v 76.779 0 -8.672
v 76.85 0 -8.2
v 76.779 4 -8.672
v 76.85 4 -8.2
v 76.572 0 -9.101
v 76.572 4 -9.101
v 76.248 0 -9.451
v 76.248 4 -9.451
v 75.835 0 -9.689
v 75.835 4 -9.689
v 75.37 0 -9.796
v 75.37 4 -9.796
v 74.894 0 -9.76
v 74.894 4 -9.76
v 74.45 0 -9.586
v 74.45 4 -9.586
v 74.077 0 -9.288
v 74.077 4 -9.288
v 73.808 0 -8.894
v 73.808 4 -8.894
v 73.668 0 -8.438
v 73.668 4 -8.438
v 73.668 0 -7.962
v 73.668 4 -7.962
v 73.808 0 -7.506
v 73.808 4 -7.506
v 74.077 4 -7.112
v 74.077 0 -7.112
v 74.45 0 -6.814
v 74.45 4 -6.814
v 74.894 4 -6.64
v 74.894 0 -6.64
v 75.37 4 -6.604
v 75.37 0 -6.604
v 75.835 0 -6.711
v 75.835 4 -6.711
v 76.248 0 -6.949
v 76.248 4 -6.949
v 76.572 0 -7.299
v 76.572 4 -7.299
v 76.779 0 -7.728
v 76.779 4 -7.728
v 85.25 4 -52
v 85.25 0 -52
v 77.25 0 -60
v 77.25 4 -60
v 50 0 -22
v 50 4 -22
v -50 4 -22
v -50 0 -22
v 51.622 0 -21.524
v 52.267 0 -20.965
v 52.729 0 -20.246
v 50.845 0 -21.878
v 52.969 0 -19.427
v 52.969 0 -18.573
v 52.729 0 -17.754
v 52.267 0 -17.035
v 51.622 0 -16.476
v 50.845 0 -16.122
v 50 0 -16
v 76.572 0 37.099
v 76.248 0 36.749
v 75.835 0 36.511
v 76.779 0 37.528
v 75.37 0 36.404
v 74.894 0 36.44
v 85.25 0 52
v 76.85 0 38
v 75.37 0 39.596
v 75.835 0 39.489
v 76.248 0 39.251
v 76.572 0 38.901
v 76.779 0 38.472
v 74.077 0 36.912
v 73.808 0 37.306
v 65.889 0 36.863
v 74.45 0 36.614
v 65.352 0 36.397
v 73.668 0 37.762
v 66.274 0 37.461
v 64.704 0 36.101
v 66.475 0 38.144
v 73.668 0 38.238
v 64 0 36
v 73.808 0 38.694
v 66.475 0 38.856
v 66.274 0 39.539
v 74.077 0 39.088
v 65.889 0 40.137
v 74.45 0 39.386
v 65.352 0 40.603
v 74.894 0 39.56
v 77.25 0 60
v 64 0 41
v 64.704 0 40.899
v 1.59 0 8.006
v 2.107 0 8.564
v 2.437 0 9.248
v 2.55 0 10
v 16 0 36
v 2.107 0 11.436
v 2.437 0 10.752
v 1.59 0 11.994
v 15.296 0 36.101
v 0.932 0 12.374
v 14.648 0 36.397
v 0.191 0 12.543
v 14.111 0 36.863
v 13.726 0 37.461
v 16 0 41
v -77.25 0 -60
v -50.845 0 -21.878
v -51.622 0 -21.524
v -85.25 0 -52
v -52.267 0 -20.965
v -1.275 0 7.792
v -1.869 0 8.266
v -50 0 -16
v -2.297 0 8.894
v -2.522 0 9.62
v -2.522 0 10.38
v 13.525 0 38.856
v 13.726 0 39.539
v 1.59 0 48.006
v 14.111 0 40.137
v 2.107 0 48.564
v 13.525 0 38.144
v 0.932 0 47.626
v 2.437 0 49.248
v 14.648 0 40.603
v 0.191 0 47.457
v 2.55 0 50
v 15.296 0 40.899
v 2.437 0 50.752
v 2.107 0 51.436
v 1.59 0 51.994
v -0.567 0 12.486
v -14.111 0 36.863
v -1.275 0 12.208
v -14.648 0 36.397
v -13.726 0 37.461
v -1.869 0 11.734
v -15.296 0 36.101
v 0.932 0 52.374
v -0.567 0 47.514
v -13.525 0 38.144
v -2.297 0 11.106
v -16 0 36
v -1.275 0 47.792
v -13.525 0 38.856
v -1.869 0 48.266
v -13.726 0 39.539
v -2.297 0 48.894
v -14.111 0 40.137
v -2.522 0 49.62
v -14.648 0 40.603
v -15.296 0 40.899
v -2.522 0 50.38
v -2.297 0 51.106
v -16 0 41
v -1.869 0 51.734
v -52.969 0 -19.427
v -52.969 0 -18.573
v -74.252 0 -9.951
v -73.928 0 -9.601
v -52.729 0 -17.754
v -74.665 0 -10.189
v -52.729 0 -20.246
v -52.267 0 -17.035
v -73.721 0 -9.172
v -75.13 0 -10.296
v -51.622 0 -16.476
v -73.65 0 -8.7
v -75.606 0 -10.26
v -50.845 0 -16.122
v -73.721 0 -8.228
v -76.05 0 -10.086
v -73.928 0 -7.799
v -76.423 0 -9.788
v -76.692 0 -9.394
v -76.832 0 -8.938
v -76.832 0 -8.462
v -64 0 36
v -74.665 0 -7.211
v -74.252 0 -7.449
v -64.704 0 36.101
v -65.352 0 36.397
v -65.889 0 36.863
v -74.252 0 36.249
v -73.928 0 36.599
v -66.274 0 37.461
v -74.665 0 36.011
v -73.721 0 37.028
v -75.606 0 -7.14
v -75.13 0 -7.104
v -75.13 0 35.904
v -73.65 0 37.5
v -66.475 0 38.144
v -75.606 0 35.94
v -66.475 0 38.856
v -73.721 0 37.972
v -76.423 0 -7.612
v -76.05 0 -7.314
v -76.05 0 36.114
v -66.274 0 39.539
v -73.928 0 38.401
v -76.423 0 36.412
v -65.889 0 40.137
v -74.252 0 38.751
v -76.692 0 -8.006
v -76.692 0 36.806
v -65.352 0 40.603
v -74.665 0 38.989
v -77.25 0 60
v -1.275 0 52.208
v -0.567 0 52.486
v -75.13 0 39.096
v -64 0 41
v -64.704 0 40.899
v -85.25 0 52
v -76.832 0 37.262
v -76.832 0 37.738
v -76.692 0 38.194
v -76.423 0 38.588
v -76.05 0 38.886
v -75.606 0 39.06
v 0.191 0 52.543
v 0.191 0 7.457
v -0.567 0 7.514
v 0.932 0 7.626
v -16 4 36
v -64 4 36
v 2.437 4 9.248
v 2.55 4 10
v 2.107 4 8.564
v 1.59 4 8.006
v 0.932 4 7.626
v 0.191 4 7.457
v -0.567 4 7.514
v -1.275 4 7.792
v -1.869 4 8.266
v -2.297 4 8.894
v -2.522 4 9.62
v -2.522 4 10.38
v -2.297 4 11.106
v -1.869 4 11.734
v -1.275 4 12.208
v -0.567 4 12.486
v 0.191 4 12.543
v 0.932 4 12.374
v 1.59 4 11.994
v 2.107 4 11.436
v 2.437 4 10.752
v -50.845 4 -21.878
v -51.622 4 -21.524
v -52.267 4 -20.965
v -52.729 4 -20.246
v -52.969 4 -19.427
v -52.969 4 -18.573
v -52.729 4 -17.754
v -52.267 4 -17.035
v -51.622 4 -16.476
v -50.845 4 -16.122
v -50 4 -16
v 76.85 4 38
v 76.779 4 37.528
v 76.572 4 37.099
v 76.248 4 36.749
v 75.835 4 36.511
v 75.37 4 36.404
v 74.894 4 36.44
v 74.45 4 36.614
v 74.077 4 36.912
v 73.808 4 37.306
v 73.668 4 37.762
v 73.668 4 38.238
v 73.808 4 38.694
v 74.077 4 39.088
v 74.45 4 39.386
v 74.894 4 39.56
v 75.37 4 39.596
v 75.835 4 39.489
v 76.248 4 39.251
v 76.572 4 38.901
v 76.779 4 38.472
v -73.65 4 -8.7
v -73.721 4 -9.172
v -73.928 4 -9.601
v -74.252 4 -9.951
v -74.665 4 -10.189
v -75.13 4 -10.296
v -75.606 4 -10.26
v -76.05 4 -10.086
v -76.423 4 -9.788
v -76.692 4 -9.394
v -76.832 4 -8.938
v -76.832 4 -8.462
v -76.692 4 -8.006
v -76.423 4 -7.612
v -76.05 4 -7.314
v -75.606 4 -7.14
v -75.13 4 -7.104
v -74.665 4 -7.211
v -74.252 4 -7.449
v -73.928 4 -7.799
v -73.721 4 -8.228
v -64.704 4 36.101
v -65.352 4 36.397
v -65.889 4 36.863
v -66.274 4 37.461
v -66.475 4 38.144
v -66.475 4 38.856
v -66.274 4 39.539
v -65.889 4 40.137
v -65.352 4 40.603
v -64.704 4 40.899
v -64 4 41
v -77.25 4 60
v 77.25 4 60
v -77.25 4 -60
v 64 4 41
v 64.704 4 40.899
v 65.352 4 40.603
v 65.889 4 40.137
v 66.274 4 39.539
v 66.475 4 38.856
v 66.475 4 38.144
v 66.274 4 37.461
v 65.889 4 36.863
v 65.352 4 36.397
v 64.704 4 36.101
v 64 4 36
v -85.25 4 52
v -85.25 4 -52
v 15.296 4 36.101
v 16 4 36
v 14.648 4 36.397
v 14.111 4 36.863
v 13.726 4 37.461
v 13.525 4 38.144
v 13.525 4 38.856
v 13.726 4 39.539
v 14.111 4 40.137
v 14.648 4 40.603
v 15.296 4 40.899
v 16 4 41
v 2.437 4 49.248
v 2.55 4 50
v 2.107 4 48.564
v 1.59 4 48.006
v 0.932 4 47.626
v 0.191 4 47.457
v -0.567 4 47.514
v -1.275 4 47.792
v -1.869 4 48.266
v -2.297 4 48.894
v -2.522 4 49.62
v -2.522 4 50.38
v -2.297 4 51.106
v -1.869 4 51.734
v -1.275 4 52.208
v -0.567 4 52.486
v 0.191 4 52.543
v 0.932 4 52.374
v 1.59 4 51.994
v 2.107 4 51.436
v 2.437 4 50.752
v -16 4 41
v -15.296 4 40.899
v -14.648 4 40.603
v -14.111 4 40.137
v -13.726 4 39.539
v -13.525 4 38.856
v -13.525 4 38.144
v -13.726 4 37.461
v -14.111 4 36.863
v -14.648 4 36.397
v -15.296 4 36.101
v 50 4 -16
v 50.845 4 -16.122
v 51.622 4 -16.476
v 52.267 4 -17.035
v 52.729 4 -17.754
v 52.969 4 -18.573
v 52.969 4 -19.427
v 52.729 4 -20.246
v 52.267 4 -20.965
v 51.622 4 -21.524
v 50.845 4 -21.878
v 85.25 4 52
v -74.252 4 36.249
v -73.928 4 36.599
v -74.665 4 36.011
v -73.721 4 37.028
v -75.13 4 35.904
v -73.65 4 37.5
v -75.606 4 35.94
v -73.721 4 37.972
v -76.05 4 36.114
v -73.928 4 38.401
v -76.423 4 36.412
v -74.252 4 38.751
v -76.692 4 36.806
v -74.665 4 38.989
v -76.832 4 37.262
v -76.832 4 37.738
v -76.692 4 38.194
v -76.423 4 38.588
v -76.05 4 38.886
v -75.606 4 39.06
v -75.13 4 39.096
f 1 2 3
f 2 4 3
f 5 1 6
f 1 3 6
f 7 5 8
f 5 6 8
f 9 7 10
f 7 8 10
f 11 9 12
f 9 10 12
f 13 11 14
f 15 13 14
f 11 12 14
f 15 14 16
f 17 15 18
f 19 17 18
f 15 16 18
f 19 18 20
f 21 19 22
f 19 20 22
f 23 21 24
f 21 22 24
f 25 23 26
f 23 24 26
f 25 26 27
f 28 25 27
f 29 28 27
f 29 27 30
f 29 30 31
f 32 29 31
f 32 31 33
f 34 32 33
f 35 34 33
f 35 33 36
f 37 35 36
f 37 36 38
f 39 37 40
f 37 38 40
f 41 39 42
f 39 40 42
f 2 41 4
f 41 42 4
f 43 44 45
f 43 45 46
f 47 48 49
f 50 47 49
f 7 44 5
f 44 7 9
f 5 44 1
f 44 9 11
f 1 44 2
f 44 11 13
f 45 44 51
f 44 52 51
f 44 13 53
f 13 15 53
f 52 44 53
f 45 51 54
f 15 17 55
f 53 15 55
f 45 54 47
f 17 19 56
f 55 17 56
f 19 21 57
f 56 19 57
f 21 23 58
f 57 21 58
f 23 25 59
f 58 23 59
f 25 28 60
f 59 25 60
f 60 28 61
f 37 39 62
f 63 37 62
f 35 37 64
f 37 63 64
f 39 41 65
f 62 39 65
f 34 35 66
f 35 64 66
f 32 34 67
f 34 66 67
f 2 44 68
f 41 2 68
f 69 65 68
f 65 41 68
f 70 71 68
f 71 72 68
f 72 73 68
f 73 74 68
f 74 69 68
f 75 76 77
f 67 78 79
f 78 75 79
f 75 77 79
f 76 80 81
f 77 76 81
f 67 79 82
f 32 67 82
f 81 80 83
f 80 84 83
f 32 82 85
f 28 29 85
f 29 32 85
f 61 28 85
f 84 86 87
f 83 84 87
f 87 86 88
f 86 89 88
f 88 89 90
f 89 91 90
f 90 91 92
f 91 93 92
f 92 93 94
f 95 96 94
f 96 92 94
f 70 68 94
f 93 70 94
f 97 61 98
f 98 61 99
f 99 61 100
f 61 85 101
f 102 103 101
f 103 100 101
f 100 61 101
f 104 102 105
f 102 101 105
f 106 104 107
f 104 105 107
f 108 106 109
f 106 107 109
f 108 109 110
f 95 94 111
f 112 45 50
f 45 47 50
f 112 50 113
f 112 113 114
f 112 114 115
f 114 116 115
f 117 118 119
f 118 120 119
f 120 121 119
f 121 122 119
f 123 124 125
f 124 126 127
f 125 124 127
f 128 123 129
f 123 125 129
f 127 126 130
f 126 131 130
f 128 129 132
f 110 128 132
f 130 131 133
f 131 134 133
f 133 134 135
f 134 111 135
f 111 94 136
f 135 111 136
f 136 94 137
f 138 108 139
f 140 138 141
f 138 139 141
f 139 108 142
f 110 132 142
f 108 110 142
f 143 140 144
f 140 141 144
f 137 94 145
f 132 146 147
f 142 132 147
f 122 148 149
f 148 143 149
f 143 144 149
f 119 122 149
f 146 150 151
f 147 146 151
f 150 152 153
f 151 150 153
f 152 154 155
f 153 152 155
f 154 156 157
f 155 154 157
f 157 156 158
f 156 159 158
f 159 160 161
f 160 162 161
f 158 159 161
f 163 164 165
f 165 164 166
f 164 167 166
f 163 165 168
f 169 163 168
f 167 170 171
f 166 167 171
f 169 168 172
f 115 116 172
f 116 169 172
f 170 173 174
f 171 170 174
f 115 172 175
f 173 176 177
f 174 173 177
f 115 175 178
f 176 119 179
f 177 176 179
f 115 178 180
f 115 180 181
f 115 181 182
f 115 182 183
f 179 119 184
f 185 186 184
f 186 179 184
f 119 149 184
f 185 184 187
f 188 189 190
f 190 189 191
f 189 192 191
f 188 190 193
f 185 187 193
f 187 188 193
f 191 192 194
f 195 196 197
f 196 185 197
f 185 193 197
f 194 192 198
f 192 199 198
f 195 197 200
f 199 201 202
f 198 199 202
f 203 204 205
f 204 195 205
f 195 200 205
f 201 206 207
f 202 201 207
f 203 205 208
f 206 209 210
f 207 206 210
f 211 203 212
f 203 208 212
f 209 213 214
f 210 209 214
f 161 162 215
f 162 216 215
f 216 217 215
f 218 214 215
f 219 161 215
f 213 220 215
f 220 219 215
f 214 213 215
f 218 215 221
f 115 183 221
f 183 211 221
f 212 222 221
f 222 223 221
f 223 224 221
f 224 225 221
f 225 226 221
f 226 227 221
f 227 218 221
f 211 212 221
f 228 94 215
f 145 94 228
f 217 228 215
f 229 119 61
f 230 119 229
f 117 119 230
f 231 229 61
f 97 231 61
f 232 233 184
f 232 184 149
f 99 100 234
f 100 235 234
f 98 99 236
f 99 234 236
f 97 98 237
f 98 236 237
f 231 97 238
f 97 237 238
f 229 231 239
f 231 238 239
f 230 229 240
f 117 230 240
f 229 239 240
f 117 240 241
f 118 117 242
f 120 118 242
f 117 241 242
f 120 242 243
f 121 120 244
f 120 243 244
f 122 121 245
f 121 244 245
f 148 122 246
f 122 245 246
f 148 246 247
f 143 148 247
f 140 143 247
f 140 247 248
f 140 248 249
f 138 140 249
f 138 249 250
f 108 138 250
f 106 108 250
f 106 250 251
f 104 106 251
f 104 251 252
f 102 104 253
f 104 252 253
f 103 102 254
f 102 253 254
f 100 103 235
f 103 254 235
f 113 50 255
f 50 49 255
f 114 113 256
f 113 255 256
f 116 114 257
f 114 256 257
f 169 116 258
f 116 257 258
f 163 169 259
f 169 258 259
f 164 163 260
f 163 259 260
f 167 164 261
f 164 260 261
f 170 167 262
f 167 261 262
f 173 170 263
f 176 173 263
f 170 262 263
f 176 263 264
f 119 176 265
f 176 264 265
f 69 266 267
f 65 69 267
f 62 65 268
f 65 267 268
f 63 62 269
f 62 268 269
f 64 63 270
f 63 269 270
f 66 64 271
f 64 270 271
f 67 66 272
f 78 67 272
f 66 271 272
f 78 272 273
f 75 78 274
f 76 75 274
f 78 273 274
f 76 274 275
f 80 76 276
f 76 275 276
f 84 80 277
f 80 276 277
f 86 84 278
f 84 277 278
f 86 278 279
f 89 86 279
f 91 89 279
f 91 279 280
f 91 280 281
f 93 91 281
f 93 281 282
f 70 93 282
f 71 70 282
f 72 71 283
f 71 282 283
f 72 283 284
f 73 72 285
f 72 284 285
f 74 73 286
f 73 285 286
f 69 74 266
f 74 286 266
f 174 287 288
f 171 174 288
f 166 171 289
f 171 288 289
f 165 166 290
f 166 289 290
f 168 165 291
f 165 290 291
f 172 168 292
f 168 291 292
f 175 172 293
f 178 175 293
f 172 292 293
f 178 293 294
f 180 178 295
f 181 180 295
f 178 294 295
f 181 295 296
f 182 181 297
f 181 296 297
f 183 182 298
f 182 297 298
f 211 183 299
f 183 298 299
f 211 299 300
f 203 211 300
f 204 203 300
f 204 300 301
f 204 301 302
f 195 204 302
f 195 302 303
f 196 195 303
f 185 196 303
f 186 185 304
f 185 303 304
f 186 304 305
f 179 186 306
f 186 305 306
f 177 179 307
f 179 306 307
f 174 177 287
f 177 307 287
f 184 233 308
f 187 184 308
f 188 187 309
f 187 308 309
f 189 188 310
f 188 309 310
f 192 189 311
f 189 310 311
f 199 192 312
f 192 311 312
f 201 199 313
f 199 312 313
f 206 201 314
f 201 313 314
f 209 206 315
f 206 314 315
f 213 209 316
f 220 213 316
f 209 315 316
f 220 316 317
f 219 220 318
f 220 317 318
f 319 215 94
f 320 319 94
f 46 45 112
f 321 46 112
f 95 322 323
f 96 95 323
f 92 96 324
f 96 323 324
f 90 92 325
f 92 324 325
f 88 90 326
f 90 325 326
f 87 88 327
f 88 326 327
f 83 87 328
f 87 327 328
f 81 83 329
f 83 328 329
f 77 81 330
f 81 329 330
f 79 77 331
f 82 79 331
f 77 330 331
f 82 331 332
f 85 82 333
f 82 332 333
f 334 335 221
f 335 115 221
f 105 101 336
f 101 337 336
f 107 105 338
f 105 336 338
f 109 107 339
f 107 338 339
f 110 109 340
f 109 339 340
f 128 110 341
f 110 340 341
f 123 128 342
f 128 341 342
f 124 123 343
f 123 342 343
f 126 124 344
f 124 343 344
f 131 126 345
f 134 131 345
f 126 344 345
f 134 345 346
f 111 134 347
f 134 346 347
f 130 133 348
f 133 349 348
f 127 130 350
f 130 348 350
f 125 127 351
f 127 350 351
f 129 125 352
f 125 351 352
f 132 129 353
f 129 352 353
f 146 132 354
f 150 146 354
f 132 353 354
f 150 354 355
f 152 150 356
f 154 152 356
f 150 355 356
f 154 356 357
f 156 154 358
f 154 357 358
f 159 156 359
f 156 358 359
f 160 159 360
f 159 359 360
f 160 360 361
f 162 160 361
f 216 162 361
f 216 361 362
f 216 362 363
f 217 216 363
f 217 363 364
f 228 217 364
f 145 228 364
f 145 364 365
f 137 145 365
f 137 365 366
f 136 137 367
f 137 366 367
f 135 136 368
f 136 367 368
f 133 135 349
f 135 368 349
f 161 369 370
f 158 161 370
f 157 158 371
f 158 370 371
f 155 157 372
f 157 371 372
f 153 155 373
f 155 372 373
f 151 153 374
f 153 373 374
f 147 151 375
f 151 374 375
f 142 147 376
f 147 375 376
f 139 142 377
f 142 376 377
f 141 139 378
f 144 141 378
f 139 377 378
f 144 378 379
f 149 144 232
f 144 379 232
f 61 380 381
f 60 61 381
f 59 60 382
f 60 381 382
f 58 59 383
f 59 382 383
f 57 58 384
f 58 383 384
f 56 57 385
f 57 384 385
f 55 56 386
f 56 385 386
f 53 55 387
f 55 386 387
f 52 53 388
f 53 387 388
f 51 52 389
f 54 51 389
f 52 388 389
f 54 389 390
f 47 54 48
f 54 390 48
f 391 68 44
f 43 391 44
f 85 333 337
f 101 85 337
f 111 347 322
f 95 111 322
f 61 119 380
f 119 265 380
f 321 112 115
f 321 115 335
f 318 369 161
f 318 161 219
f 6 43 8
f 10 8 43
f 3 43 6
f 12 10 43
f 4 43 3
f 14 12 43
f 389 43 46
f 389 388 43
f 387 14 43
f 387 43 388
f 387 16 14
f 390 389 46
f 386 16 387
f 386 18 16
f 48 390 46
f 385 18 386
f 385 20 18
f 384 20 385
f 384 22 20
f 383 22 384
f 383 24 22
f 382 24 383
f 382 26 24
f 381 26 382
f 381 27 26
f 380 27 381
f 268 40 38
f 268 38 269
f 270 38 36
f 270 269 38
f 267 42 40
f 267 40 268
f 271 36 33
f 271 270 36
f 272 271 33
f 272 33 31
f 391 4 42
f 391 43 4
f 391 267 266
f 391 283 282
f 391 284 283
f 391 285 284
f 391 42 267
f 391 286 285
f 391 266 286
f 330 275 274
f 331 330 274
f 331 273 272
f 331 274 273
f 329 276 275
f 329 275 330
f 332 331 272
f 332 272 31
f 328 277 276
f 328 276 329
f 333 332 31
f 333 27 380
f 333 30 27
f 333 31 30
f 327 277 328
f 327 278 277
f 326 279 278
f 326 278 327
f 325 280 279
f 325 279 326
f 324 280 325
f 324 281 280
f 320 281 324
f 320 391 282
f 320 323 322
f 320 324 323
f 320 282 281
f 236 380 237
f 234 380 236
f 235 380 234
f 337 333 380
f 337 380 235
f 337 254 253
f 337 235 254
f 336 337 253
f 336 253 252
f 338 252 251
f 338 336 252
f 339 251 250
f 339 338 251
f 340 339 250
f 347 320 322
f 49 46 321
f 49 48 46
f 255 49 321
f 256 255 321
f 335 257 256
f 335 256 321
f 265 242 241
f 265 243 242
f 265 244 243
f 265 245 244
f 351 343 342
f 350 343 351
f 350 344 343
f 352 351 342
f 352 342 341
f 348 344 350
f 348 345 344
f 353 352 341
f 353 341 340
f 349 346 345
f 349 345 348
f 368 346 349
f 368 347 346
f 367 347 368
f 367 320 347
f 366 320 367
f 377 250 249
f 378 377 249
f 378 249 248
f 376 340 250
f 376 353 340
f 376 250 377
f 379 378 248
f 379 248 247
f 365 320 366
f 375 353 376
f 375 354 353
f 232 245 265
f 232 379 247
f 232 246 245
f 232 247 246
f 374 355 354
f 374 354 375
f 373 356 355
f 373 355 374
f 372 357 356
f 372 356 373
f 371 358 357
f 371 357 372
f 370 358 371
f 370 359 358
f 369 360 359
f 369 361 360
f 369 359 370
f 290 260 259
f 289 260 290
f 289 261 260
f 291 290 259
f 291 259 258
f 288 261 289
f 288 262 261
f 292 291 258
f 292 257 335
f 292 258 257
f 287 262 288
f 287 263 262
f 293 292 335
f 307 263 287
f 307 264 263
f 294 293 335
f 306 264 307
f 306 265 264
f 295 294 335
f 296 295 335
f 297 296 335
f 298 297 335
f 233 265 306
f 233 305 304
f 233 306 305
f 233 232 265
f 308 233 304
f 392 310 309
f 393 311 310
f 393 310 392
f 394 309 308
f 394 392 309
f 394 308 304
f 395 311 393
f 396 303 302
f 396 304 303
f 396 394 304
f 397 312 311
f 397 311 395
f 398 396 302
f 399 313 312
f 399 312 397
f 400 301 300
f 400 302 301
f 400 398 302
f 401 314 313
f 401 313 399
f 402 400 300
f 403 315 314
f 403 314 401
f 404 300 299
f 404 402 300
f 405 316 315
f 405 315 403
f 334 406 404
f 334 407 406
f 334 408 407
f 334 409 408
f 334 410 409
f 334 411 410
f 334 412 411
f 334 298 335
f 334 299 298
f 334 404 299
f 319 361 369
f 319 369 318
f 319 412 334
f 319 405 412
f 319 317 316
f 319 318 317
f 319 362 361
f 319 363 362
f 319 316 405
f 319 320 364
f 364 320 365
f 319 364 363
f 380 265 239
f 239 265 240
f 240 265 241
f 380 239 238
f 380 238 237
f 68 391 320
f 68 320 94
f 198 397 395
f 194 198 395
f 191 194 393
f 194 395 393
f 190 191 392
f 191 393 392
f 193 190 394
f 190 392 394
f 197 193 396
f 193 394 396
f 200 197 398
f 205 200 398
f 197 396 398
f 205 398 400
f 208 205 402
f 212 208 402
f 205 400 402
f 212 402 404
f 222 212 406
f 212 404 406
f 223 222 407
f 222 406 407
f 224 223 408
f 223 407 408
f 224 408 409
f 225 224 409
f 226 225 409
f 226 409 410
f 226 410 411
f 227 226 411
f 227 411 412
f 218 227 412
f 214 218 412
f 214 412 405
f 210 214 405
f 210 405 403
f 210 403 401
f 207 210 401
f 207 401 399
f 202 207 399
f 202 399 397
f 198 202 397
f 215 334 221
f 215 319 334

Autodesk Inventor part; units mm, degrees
ref_plane "YZ Plane" through (0, 0, 0) normal (1, 0, 0) x (0, 1, 0)
ref_plane "XZ Plane" through (0, 0, 0) normal (0, 1, 0) x (-1, 0, 0)
ref_plane "XY Plane" through (0, 0, 0) normal (0, 0, 1) x (1, 0, 0)
sketch "Эскиз1" plane through (0, 0, 0) normal (0, 1, 0) x (-1, 0, 0)
  line L0 (85.25, 60) -> (-85.25, 60)
  line L1 (-85.25, 60) -> (-85.25, -60)
  line L2 (-85.25, -60) -> (85.25, -60)
  line L3 (85.25, -60) -> (85.25, 60)
  line L4 (85.25, 60) -> (-85.25, -60) construction
  line L5 (-85.25, 60) -> (85.25, -60) construction
  point P0 (0, 0)
  dimension "d0" = 170.5
  dimension "d1" = 120
extrude "Выдавливание1" add sketch "Эскиз1" along normal blind 4
sketch "Эскиз2" plane through (0, 4, 0) normal (0, 1, 0) x (1, 0, 0)
  circle A0 centre (-75.25, 8.7) radius 1.6 projected
  circle A1 centre (75.25, 8.2) radius 1.6 projected
  circle A2 centre (-75.25, -37.5) radius 1.6 projected
  circle A3 centre (75.25, -38) radius 1.6 projected
  point P0 (0, 0)
extrude "Выдавливание2" cut sketch "Эскиз2" against normal blind 4
chamfer "Фаска1" distance 8 angle 45 4 edges at (-85.25, 2, -60) (-85.25, 2, 60) (85.25, 2, -60) (85.25, 2, 60)
sketch "Эскиз3" plane through (0, 4, 0) normal (0, 1, 0) x (1, 0, 0)
  circle A0 centre (0, -50) radius 2.55
  circle A1 centre (0, -10) radius 2.55
  line L0 (-85.25, 52) -> (-85.25, -52) projected
  line L1 (-77.25, -60) -> (77.25, -60) projected
  point P0 (0, 0)
  dimension "d11" = 85.25
  dimension "d12" = 10
  dimension "d13" = 5.1
extrude "Выдавливание3" cut sketch "Эскиз3" against normal blind 10
sketch "Эскиз4" plane through (0, 4, 0) normal (0, 1, 0) x (1, 0, 0)
  circle A0 centre (0, -50) radius 2.55 construction
  line L0 (64, -38.5) -> (16, -38.5) construction
  line L1 (64, -36) -> (16, -36)
  line L2 (16, -41) -> (64, -41)
  arc A1 (64, -41) -> (64, -36) centre (64, -38.5) ccw
  arc A2 (16, -36) -> (16, -41) centre (16, -38.5) ccw
  line L3 (-77.25, -60) -> (77.25, -60) construction
  line L4 (0, -60) -> (0, 0) construction
  line L5 (50, 19) -> (-50, 19) construction
  line L6 (50, 22) -> (-50, 22)
  line L7 (-50, 16) -> (50, 16)
  arc A3 (50, 16) -> (50, 22) centre (50, 19) ccw
  arc A4 (-50, 22) -> (-50, 16) centre (-50, 19) ccw
  line L8 (0, 0) -> (0, 38) construction
  line L9 (-64, -38.5) -> (-16, -38.5) construction
  line L10 (-64, -36) -> (-16, -36)
  line L11 (-16, -41) -> (-64, -41)
  arc A5 (-64, -36) -> (-64, -41) centre (-64, -38.5) ccw
  arc A6 (-16, -41) -> (-16, -36) centre (-16, -38.5) ccw
  line L12 (77.25, -60) -> (-77.25, -60) construction
  point P0 (40, -38.5)
  point P1 (0, 19)
  point P2 (0, 19)
  point P3 (-40, -38.5)
  dimension "d14" = 24
  dimension "d15" = 5
  dimension "d16" = 16
  dimension "d17" = 50
  dimension "d18" = 6
  dimension "d21" = 16
extrude "Выдавливание4" cut sketch "Эскиз4" against normal blind 10
properties part number "фанера" material "Древесина (береза)"
